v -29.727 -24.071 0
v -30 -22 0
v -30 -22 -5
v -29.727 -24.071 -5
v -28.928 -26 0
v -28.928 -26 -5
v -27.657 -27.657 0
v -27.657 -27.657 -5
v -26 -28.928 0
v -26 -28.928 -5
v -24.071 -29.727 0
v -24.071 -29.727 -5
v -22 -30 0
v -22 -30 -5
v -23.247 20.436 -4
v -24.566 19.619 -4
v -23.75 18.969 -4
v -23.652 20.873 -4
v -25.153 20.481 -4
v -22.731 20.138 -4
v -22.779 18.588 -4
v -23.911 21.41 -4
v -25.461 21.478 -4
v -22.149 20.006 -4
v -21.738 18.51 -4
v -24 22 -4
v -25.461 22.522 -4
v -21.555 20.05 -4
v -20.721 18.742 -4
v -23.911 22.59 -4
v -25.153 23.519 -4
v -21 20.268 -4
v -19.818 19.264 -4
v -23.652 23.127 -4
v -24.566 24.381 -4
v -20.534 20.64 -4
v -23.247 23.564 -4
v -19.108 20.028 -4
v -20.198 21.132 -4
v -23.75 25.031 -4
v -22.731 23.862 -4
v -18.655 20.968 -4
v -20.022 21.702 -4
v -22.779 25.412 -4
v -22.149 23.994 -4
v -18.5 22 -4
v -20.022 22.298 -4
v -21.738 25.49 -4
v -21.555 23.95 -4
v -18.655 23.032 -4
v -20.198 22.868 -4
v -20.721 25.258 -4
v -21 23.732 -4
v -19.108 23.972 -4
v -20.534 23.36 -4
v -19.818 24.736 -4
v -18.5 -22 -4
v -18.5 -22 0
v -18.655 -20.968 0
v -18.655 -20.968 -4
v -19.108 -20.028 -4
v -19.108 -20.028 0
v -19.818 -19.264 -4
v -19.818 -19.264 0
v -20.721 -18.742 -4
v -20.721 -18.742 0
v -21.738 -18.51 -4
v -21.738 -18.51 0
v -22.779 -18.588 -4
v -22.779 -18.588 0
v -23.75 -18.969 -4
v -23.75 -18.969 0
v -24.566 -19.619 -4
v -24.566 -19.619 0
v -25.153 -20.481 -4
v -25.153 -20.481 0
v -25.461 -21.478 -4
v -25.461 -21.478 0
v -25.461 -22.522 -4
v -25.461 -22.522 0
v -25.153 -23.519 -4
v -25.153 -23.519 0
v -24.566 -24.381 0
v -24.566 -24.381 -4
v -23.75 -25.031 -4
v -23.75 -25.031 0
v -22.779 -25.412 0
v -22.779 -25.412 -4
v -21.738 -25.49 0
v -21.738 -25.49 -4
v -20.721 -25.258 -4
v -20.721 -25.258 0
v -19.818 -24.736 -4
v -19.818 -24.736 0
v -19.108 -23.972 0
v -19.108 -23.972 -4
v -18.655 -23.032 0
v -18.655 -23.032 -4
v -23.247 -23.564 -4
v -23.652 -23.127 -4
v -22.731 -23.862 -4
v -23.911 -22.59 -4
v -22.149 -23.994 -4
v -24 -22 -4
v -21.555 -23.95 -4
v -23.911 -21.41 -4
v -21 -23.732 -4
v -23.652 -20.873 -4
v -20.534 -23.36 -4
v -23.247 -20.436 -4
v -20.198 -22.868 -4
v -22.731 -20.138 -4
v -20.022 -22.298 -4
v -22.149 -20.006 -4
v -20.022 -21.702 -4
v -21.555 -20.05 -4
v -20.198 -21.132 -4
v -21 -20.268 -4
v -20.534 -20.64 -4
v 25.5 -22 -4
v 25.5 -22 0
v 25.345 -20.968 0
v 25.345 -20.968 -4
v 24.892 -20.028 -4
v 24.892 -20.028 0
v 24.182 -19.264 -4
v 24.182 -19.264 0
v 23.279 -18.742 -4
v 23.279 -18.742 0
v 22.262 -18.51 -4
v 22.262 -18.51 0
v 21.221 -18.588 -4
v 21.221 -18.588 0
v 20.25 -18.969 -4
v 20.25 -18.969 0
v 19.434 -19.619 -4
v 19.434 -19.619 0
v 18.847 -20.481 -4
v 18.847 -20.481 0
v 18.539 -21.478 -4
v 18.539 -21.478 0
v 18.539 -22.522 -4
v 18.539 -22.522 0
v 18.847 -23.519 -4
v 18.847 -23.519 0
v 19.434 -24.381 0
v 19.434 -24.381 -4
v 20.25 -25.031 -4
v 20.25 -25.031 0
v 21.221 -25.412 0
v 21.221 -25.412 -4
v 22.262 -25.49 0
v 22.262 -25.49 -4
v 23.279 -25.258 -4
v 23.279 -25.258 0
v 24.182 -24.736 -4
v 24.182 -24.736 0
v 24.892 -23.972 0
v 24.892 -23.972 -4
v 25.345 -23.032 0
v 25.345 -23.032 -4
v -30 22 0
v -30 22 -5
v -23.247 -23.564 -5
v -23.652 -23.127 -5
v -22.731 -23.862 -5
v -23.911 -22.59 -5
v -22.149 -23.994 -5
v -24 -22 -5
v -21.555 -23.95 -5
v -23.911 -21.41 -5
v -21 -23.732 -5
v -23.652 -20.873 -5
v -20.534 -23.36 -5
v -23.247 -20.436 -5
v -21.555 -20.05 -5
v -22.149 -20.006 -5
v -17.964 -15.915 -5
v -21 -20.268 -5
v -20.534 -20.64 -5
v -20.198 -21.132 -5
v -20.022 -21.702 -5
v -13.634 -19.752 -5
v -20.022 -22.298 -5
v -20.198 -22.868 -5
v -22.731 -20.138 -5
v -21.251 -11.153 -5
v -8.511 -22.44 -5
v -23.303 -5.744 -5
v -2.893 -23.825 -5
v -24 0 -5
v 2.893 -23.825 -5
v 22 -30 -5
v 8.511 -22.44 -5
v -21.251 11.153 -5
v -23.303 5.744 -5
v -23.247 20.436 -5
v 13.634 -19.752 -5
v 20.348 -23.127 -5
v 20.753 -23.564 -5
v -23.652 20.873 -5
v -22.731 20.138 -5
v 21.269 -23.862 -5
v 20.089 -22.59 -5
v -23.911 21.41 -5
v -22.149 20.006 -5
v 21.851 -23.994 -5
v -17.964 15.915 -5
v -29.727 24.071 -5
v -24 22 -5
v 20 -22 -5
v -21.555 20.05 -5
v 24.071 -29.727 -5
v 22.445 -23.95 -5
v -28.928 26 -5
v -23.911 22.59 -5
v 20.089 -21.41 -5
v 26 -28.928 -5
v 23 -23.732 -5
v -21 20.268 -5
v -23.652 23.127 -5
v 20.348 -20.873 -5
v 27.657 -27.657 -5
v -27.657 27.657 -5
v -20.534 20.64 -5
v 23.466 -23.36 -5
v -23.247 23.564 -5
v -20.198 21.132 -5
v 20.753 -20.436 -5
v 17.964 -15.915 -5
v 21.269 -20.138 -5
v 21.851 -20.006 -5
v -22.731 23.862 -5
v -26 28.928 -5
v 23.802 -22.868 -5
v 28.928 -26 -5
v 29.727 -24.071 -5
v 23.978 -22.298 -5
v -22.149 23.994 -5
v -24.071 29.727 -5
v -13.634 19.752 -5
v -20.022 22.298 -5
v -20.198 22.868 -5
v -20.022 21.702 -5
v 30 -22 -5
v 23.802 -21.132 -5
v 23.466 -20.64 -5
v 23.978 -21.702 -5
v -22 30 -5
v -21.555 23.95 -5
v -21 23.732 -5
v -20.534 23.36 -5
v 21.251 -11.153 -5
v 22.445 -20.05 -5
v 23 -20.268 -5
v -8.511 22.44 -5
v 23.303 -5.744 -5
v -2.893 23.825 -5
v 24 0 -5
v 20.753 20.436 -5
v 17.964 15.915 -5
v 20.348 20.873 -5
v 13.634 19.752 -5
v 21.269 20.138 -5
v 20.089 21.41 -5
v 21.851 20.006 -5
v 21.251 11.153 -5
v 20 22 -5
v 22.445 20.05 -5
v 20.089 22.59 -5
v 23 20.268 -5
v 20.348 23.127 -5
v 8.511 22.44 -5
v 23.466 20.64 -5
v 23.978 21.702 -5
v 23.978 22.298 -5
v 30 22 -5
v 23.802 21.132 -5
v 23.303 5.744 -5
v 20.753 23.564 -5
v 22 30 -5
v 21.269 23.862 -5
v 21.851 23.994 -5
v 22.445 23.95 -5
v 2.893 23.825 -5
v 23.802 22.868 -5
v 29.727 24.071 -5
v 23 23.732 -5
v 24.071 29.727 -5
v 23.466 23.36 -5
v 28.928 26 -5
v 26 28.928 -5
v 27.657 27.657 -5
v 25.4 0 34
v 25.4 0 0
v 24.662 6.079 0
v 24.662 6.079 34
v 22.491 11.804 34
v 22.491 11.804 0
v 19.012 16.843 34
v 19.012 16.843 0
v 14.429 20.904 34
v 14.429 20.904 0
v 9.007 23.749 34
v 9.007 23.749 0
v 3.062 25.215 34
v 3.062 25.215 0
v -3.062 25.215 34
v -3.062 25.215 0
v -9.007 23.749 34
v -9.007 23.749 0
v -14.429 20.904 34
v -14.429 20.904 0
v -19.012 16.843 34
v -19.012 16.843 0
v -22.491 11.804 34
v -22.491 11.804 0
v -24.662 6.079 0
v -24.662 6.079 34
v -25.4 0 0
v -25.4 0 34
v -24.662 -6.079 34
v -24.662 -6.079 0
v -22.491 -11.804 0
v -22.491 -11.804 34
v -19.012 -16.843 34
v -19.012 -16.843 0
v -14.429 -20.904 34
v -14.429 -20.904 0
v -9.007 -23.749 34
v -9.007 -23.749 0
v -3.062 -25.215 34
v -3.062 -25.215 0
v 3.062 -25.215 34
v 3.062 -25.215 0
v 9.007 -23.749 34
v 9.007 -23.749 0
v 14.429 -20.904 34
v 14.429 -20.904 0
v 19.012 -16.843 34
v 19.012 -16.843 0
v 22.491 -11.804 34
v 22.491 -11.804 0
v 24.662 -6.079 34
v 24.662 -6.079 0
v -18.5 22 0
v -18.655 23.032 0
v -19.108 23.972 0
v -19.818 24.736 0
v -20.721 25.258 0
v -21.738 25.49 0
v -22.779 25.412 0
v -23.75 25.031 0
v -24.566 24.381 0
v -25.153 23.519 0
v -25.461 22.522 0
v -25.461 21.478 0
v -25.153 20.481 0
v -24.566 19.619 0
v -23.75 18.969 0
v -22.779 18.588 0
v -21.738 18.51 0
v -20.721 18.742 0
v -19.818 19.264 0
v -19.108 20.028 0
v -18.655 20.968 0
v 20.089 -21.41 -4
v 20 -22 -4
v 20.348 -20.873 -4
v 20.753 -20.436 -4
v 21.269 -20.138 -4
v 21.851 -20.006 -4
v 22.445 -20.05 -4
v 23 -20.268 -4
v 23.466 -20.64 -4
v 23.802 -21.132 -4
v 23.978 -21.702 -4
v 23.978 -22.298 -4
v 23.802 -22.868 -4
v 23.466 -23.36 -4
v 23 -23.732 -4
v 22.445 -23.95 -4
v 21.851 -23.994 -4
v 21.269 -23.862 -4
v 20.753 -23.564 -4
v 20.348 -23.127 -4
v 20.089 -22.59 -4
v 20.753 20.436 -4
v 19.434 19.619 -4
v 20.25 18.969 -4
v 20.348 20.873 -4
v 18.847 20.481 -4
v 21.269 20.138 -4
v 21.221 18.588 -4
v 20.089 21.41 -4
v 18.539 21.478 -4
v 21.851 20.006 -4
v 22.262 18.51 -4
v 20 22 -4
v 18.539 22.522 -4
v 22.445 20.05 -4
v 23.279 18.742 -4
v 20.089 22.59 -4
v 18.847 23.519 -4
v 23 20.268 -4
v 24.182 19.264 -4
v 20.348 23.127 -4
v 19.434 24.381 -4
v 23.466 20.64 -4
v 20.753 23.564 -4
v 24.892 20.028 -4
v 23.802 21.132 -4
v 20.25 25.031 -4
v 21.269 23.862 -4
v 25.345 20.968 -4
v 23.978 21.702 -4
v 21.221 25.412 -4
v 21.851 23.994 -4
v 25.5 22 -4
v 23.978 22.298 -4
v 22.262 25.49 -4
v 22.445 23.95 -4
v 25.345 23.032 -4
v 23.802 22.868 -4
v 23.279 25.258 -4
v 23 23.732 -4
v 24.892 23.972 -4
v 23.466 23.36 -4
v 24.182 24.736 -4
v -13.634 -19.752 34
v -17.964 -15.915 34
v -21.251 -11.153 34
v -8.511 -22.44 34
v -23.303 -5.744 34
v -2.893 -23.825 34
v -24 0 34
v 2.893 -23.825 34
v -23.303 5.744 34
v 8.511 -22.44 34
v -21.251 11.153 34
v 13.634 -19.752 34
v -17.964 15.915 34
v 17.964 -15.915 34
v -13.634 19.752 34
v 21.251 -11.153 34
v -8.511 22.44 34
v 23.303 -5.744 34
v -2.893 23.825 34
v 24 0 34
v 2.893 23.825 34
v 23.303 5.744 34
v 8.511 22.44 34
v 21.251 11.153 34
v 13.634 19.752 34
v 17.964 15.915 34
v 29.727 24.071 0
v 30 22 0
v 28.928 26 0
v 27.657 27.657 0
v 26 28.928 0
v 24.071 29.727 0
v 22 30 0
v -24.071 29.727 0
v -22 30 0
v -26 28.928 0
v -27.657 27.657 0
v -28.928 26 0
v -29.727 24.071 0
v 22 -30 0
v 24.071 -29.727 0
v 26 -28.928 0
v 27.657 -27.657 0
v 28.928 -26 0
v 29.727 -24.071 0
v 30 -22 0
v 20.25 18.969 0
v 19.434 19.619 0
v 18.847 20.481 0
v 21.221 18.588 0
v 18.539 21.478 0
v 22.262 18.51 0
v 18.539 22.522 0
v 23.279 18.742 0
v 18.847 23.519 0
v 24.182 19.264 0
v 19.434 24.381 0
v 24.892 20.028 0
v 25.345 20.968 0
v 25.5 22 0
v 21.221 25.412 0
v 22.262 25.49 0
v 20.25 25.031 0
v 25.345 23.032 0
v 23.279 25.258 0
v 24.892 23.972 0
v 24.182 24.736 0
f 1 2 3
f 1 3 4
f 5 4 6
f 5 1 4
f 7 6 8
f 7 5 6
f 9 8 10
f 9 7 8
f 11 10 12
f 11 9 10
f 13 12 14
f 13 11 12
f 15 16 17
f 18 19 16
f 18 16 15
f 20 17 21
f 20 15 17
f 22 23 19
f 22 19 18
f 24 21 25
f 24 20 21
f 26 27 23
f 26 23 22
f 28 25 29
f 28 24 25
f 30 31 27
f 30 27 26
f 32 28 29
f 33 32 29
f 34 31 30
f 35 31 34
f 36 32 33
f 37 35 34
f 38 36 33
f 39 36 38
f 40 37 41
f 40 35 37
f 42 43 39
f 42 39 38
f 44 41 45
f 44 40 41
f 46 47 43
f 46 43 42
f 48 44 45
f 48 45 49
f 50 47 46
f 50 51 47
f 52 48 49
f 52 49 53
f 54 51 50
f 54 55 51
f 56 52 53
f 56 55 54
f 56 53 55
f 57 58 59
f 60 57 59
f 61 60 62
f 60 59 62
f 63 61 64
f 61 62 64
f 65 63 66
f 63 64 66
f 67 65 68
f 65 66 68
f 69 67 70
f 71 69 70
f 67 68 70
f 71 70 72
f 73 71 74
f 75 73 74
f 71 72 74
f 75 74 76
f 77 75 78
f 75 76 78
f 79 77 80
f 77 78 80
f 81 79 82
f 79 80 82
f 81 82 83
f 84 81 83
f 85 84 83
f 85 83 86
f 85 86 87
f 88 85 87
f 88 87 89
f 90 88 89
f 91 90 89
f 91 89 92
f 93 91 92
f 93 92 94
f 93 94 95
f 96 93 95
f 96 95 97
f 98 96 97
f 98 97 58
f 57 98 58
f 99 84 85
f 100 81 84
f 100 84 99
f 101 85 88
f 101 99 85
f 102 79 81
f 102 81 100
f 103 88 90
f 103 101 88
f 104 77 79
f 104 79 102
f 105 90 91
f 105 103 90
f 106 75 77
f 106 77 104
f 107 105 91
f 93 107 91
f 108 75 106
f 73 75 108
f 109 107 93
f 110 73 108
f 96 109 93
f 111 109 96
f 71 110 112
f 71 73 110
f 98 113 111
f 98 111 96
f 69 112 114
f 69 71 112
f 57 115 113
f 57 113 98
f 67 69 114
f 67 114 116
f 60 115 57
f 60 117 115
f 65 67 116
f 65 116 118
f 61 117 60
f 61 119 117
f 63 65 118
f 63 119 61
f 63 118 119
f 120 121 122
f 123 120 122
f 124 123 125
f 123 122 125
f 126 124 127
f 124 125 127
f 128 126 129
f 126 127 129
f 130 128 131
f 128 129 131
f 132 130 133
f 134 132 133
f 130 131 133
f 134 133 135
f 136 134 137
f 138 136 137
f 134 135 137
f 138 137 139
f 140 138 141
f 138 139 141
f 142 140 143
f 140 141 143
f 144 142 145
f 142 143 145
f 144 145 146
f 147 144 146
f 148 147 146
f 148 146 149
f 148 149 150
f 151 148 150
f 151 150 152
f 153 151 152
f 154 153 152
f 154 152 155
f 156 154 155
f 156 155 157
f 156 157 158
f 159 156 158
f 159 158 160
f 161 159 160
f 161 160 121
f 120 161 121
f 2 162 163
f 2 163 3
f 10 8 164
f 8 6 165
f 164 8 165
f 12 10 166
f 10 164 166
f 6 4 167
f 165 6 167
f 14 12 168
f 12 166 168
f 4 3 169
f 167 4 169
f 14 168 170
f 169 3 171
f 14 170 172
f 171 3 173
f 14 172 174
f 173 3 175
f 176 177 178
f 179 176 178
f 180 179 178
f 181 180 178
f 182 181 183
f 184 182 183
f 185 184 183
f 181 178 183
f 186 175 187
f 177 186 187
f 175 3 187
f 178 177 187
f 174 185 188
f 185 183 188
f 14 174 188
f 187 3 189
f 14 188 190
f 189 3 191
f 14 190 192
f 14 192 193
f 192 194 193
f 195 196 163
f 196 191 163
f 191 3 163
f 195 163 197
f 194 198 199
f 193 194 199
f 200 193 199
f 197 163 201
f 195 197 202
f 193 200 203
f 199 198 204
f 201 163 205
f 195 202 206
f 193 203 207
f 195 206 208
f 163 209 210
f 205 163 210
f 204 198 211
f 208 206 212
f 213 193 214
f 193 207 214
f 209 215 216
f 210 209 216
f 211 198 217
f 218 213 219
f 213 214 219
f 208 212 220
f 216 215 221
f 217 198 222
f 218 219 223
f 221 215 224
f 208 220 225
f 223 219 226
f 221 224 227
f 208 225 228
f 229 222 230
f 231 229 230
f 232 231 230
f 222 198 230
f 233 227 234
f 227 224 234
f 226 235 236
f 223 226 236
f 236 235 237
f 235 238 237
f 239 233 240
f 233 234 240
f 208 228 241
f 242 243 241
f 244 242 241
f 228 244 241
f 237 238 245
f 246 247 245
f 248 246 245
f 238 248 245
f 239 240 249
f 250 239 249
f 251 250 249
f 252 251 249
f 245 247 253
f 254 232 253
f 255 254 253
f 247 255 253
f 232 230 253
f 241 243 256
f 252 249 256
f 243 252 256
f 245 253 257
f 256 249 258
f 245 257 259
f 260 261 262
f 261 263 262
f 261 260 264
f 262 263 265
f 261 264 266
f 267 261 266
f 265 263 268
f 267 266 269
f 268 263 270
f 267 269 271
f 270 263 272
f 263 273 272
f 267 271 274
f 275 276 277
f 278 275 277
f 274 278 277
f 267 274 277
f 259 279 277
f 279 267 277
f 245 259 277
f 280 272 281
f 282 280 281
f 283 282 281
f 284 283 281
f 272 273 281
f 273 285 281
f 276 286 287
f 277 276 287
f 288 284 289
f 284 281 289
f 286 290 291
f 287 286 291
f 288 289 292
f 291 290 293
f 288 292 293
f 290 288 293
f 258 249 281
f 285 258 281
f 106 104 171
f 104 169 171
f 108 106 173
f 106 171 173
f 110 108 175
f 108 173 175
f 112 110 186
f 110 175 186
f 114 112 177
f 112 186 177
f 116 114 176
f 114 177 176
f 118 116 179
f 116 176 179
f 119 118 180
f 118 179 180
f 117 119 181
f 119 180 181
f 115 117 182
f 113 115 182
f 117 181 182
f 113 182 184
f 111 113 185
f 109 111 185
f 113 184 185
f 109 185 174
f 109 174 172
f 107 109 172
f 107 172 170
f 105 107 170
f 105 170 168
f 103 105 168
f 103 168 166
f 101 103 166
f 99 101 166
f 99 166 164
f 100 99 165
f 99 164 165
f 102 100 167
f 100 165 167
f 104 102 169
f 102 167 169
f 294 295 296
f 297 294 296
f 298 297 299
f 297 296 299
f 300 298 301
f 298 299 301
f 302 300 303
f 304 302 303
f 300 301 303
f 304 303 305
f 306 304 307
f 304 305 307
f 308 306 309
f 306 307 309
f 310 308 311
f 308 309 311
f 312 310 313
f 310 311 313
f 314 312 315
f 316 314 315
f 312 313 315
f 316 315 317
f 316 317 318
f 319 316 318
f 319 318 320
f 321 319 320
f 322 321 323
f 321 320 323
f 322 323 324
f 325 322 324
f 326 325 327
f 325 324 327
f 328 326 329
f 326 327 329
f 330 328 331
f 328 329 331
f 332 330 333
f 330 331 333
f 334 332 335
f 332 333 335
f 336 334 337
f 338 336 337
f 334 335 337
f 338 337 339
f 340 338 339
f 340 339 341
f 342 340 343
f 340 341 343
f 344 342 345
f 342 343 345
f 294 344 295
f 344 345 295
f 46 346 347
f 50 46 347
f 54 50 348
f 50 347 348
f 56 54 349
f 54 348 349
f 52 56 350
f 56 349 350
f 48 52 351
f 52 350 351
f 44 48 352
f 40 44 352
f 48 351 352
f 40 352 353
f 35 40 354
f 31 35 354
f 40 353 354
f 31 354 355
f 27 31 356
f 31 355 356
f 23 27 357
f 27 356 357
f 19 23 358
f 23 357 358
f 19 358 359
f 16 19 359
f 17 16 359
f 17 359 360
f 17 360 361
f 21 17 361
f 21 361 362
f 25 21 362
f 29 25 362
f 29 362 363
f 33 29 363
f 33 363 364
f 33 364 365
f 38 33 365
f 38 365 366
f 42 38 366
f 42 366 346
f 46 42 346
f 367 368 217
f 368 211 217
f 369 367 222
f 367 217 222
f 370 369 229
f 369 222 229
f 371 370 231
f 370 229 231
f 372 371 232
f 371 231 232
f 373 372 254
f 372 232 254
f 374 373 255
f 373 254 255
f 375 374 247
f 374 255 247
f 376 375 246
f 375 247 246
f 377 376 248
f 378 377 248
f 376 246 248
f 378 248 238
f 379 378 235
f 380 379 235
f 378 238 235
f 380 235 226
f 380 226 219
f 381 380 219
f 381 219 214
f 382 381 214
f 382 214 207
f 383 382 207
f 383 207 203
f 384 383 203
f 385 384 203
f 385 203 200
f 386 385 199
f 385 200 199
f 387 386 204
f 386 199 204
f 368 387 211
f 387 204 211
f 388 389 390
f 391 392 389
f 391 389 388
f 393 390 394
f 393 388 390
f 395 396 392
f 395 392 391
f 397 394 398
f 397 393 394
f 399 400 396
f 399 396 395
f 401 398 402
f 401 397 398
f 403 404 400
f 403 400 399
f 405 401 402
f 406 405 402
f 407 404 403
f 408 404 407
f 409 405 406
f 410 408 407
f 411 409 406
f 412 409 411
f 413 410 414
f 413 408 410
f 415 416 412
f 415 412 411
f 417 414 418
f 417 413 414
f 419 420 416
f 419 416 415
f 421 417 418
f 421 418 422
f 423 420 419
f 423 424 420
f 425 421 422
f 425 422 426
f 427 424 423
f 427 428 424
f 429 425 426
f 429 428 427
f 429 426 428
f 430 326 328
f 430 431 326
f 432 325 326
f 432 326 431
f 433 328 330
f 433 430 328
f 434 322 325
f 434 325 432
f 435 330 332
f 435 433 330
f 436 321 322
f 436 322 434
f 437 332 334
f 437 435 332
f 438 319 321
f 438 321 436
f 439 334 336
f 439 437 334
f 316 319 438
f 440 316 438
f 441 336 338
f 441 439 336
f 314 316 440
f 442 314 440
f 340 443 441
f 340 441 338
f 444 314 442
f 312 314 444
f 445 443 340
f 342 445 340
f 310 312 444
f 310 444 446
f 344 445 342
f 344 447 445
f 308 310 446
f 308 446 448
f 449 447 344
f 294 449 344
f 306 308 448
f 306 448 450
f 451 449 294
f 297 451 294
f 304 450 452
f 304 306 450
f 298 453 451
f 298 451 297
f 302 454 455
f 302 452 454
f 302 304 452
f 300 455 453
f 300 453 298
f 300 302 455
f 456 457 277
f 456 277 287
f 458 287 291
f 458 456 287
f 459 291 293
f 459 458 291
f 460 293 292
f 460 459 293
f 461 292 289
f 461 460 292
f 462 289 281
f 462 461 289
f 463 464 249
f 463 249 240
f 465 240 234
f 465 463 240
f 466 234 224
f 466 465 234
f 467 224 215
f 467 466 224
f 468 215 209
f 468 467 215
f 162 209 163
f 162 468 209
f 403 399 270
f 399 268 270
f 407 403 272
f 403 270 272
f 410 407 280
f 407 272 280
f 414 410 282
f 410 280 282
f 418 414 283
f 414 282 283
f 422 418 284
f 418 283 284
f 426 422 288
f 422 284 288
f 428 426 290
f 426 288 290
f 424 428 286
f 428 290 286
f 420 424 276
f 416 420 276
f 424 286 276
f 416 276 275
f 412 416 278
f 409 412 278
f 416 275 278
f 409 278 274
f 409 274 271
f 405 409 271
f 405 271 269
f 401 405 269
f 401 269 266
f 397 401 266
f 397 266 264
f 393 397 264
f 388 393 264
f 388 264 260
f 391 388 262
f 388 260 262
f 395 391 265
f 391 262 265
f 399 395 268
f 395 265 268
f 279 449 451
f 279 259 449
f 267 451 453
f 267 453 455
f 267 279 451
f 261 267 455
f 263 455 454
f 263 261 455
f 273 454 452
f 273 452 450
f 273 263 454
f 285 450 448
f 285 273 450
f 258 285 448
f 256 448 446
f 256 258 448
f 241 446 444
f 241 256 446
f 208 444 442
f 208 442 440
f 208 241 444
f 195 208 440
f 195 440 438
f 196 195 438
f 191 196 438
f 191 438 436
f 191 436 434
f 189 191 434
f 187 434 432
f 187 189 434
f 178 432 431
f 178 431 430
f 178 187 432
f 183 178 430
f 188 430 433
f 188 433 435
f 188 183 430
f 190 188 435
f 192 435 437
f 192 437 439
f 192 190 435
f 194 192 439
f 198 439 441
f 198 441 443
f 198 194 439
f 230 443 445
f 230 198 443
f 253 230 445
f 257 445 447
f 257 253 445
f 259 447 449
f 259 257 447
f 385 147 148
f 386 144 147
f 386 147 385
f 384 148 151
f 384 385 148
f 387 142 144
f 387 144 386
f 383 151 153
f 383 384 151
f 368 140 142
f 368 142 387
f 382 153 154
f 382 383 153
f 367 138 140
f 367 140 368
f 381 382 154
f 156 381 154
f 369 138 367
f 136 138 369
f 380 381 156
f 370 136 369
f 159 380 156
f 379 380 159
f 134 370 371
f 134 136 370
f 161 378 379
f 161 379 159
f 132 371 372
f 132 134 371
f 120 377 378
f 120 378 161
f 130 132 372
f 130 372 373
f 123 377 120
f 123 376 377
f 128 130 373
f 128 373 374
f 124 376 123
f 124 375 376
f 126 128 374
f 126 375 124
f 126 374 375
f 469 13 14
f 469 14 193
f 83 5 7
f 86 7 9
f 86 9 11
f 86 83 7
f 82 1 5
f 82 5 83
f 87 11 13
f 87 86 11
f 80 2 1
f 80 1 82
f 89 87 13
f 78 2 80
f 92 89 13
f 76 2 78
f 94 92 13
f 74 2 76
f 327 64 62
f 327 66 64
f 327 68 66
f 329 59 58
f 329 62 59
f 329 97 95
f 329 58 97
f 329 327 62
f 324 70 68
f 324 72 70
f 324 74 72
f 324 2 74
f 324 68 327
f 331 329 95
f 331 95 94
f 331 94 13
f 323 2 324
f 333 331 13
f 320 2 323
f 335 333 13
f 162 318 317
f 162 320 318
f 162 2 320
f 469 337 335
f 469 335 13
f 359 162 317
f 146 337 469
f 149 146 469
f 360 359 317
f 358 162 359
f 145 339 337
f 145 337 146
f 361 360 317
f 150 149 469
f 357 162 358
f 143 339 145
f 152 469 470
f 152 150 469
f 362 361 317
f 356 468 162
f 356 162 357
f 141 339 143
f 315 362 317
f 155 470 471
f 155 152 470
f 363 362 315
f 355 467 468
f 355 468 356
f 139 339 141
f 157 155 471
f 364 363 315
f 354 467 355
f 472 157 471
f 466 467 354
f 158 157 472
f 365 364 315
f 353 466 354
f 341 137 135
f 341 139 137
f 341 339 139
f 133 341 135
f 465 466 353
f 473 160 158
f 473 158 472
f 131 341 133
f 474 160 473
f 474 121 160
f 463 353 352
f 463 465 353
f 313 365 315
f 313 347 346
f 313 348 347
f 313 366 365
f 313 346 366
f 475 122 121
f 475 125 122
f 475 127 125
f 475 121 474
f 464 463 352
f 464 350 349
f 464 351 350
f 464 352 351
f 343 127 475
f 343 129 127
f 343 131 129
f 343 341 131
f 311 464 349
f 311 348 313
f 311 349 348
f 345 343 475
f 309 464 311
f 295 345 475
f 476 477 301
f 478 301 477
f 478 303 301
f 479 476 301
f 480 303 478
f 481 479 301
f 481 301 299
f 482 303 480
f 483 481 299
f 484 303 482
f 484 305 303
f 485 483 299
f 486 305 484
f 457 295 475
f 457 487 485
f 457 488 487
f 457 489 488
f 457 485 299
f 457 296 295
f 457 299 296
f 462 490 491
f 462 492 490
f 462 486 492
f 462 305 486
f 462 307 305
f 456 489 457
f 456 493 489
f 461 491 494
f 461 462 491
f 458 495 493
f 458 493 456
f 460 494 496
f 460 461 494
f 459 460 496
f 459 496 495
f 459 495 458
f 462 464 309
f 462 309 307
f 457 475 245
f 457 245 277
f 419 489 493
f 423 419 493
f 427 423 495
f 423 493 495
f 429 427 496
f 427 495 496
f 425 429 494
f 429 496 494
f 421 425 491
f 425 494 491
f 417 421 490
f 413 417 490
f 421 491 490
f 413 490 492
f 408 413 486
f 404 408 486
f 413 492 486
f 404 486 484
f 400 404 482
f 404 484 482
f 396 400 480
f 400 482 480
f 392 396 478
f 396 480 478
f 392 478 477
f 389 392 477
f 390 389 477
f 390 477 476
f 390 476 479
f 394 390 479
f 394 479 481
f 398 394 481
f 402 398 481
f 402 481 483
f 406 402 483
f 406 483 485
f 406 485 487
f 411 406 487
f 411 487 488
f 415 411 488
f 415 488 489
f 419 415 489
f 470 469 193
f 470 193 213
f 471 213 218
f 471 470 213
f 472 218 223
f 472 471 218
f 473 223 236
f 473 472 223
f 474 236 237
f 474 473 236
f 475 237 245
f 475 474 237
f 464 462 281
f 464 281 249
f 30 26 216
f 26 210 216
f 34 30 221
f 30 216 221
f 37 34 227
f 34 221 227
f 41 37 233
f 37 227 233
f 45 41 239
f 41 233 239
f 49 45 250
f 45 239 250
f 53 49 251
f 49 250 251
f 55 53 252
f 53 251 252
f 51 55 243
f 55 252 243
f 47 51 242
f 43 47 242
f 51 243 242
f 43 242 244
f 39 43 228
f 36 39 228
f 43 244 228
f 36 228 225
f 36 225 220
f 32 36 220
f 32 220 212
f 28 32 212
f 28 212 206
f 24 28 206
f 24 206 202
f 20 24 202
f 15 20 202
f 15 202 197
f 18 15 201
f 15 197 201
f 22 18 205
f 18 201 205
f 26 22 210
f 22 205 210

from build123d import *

# Parameters (mm, degrees)
F0_R           = 24
F1_DEPTH       = 5
F2_R           = 25.4
F2_R_2         = 24
F3_DEPTH       = 34
F4_D           = 4
F4_CBORE_D     = 7
F4_CBORE_DEPTH = 4


with BuildPart() as f1:
    # F0 (on Top) → F1 (new body)
    with BuildSketch(Plane.XY):
        with BuildLine():
            Line((22, 30), (-22, 30))
            ThreePointArc((-22, 30), (-27.656854, 27.656854), (-30, 22))
            Line((-30, 22), (-30, -22))
            ThreePointArc((-30, -22), (-27.656854, -27.656854), (-22, -30))
            Line((-22, -30), (22, -30))
            ThreePointArc((22, -30), (27.656854, -27.656854), (30, -22))
            Line((30, -22), (30, 22))
            ThreePointArc((30, 22), (27.656854, 27.656854), (22, 30))
        make_face()
        Circle(F0_R, mode=Mode.SUBTRACT)
    extrude(amount=-F1_DEPTH)

    # F2 (on face) → F3 (join)
    with BuildSketch(Plane.XY):
        Circle(F2_R)
        Circle(F2_R_2, mode=Mode.SUBTRACT)
    extrude(amount=F3_DEPTH)

    # F4 (through all)
    with Locations(Plane.XY):
        with Locations((-22, -22), (22, -22), (22, 22), (-22, 22)):
            CounterBoreHole(F4_D / 2, F4_CBORE_D / 2, F4_CBORE_DEPTH)


solid = f1.part
